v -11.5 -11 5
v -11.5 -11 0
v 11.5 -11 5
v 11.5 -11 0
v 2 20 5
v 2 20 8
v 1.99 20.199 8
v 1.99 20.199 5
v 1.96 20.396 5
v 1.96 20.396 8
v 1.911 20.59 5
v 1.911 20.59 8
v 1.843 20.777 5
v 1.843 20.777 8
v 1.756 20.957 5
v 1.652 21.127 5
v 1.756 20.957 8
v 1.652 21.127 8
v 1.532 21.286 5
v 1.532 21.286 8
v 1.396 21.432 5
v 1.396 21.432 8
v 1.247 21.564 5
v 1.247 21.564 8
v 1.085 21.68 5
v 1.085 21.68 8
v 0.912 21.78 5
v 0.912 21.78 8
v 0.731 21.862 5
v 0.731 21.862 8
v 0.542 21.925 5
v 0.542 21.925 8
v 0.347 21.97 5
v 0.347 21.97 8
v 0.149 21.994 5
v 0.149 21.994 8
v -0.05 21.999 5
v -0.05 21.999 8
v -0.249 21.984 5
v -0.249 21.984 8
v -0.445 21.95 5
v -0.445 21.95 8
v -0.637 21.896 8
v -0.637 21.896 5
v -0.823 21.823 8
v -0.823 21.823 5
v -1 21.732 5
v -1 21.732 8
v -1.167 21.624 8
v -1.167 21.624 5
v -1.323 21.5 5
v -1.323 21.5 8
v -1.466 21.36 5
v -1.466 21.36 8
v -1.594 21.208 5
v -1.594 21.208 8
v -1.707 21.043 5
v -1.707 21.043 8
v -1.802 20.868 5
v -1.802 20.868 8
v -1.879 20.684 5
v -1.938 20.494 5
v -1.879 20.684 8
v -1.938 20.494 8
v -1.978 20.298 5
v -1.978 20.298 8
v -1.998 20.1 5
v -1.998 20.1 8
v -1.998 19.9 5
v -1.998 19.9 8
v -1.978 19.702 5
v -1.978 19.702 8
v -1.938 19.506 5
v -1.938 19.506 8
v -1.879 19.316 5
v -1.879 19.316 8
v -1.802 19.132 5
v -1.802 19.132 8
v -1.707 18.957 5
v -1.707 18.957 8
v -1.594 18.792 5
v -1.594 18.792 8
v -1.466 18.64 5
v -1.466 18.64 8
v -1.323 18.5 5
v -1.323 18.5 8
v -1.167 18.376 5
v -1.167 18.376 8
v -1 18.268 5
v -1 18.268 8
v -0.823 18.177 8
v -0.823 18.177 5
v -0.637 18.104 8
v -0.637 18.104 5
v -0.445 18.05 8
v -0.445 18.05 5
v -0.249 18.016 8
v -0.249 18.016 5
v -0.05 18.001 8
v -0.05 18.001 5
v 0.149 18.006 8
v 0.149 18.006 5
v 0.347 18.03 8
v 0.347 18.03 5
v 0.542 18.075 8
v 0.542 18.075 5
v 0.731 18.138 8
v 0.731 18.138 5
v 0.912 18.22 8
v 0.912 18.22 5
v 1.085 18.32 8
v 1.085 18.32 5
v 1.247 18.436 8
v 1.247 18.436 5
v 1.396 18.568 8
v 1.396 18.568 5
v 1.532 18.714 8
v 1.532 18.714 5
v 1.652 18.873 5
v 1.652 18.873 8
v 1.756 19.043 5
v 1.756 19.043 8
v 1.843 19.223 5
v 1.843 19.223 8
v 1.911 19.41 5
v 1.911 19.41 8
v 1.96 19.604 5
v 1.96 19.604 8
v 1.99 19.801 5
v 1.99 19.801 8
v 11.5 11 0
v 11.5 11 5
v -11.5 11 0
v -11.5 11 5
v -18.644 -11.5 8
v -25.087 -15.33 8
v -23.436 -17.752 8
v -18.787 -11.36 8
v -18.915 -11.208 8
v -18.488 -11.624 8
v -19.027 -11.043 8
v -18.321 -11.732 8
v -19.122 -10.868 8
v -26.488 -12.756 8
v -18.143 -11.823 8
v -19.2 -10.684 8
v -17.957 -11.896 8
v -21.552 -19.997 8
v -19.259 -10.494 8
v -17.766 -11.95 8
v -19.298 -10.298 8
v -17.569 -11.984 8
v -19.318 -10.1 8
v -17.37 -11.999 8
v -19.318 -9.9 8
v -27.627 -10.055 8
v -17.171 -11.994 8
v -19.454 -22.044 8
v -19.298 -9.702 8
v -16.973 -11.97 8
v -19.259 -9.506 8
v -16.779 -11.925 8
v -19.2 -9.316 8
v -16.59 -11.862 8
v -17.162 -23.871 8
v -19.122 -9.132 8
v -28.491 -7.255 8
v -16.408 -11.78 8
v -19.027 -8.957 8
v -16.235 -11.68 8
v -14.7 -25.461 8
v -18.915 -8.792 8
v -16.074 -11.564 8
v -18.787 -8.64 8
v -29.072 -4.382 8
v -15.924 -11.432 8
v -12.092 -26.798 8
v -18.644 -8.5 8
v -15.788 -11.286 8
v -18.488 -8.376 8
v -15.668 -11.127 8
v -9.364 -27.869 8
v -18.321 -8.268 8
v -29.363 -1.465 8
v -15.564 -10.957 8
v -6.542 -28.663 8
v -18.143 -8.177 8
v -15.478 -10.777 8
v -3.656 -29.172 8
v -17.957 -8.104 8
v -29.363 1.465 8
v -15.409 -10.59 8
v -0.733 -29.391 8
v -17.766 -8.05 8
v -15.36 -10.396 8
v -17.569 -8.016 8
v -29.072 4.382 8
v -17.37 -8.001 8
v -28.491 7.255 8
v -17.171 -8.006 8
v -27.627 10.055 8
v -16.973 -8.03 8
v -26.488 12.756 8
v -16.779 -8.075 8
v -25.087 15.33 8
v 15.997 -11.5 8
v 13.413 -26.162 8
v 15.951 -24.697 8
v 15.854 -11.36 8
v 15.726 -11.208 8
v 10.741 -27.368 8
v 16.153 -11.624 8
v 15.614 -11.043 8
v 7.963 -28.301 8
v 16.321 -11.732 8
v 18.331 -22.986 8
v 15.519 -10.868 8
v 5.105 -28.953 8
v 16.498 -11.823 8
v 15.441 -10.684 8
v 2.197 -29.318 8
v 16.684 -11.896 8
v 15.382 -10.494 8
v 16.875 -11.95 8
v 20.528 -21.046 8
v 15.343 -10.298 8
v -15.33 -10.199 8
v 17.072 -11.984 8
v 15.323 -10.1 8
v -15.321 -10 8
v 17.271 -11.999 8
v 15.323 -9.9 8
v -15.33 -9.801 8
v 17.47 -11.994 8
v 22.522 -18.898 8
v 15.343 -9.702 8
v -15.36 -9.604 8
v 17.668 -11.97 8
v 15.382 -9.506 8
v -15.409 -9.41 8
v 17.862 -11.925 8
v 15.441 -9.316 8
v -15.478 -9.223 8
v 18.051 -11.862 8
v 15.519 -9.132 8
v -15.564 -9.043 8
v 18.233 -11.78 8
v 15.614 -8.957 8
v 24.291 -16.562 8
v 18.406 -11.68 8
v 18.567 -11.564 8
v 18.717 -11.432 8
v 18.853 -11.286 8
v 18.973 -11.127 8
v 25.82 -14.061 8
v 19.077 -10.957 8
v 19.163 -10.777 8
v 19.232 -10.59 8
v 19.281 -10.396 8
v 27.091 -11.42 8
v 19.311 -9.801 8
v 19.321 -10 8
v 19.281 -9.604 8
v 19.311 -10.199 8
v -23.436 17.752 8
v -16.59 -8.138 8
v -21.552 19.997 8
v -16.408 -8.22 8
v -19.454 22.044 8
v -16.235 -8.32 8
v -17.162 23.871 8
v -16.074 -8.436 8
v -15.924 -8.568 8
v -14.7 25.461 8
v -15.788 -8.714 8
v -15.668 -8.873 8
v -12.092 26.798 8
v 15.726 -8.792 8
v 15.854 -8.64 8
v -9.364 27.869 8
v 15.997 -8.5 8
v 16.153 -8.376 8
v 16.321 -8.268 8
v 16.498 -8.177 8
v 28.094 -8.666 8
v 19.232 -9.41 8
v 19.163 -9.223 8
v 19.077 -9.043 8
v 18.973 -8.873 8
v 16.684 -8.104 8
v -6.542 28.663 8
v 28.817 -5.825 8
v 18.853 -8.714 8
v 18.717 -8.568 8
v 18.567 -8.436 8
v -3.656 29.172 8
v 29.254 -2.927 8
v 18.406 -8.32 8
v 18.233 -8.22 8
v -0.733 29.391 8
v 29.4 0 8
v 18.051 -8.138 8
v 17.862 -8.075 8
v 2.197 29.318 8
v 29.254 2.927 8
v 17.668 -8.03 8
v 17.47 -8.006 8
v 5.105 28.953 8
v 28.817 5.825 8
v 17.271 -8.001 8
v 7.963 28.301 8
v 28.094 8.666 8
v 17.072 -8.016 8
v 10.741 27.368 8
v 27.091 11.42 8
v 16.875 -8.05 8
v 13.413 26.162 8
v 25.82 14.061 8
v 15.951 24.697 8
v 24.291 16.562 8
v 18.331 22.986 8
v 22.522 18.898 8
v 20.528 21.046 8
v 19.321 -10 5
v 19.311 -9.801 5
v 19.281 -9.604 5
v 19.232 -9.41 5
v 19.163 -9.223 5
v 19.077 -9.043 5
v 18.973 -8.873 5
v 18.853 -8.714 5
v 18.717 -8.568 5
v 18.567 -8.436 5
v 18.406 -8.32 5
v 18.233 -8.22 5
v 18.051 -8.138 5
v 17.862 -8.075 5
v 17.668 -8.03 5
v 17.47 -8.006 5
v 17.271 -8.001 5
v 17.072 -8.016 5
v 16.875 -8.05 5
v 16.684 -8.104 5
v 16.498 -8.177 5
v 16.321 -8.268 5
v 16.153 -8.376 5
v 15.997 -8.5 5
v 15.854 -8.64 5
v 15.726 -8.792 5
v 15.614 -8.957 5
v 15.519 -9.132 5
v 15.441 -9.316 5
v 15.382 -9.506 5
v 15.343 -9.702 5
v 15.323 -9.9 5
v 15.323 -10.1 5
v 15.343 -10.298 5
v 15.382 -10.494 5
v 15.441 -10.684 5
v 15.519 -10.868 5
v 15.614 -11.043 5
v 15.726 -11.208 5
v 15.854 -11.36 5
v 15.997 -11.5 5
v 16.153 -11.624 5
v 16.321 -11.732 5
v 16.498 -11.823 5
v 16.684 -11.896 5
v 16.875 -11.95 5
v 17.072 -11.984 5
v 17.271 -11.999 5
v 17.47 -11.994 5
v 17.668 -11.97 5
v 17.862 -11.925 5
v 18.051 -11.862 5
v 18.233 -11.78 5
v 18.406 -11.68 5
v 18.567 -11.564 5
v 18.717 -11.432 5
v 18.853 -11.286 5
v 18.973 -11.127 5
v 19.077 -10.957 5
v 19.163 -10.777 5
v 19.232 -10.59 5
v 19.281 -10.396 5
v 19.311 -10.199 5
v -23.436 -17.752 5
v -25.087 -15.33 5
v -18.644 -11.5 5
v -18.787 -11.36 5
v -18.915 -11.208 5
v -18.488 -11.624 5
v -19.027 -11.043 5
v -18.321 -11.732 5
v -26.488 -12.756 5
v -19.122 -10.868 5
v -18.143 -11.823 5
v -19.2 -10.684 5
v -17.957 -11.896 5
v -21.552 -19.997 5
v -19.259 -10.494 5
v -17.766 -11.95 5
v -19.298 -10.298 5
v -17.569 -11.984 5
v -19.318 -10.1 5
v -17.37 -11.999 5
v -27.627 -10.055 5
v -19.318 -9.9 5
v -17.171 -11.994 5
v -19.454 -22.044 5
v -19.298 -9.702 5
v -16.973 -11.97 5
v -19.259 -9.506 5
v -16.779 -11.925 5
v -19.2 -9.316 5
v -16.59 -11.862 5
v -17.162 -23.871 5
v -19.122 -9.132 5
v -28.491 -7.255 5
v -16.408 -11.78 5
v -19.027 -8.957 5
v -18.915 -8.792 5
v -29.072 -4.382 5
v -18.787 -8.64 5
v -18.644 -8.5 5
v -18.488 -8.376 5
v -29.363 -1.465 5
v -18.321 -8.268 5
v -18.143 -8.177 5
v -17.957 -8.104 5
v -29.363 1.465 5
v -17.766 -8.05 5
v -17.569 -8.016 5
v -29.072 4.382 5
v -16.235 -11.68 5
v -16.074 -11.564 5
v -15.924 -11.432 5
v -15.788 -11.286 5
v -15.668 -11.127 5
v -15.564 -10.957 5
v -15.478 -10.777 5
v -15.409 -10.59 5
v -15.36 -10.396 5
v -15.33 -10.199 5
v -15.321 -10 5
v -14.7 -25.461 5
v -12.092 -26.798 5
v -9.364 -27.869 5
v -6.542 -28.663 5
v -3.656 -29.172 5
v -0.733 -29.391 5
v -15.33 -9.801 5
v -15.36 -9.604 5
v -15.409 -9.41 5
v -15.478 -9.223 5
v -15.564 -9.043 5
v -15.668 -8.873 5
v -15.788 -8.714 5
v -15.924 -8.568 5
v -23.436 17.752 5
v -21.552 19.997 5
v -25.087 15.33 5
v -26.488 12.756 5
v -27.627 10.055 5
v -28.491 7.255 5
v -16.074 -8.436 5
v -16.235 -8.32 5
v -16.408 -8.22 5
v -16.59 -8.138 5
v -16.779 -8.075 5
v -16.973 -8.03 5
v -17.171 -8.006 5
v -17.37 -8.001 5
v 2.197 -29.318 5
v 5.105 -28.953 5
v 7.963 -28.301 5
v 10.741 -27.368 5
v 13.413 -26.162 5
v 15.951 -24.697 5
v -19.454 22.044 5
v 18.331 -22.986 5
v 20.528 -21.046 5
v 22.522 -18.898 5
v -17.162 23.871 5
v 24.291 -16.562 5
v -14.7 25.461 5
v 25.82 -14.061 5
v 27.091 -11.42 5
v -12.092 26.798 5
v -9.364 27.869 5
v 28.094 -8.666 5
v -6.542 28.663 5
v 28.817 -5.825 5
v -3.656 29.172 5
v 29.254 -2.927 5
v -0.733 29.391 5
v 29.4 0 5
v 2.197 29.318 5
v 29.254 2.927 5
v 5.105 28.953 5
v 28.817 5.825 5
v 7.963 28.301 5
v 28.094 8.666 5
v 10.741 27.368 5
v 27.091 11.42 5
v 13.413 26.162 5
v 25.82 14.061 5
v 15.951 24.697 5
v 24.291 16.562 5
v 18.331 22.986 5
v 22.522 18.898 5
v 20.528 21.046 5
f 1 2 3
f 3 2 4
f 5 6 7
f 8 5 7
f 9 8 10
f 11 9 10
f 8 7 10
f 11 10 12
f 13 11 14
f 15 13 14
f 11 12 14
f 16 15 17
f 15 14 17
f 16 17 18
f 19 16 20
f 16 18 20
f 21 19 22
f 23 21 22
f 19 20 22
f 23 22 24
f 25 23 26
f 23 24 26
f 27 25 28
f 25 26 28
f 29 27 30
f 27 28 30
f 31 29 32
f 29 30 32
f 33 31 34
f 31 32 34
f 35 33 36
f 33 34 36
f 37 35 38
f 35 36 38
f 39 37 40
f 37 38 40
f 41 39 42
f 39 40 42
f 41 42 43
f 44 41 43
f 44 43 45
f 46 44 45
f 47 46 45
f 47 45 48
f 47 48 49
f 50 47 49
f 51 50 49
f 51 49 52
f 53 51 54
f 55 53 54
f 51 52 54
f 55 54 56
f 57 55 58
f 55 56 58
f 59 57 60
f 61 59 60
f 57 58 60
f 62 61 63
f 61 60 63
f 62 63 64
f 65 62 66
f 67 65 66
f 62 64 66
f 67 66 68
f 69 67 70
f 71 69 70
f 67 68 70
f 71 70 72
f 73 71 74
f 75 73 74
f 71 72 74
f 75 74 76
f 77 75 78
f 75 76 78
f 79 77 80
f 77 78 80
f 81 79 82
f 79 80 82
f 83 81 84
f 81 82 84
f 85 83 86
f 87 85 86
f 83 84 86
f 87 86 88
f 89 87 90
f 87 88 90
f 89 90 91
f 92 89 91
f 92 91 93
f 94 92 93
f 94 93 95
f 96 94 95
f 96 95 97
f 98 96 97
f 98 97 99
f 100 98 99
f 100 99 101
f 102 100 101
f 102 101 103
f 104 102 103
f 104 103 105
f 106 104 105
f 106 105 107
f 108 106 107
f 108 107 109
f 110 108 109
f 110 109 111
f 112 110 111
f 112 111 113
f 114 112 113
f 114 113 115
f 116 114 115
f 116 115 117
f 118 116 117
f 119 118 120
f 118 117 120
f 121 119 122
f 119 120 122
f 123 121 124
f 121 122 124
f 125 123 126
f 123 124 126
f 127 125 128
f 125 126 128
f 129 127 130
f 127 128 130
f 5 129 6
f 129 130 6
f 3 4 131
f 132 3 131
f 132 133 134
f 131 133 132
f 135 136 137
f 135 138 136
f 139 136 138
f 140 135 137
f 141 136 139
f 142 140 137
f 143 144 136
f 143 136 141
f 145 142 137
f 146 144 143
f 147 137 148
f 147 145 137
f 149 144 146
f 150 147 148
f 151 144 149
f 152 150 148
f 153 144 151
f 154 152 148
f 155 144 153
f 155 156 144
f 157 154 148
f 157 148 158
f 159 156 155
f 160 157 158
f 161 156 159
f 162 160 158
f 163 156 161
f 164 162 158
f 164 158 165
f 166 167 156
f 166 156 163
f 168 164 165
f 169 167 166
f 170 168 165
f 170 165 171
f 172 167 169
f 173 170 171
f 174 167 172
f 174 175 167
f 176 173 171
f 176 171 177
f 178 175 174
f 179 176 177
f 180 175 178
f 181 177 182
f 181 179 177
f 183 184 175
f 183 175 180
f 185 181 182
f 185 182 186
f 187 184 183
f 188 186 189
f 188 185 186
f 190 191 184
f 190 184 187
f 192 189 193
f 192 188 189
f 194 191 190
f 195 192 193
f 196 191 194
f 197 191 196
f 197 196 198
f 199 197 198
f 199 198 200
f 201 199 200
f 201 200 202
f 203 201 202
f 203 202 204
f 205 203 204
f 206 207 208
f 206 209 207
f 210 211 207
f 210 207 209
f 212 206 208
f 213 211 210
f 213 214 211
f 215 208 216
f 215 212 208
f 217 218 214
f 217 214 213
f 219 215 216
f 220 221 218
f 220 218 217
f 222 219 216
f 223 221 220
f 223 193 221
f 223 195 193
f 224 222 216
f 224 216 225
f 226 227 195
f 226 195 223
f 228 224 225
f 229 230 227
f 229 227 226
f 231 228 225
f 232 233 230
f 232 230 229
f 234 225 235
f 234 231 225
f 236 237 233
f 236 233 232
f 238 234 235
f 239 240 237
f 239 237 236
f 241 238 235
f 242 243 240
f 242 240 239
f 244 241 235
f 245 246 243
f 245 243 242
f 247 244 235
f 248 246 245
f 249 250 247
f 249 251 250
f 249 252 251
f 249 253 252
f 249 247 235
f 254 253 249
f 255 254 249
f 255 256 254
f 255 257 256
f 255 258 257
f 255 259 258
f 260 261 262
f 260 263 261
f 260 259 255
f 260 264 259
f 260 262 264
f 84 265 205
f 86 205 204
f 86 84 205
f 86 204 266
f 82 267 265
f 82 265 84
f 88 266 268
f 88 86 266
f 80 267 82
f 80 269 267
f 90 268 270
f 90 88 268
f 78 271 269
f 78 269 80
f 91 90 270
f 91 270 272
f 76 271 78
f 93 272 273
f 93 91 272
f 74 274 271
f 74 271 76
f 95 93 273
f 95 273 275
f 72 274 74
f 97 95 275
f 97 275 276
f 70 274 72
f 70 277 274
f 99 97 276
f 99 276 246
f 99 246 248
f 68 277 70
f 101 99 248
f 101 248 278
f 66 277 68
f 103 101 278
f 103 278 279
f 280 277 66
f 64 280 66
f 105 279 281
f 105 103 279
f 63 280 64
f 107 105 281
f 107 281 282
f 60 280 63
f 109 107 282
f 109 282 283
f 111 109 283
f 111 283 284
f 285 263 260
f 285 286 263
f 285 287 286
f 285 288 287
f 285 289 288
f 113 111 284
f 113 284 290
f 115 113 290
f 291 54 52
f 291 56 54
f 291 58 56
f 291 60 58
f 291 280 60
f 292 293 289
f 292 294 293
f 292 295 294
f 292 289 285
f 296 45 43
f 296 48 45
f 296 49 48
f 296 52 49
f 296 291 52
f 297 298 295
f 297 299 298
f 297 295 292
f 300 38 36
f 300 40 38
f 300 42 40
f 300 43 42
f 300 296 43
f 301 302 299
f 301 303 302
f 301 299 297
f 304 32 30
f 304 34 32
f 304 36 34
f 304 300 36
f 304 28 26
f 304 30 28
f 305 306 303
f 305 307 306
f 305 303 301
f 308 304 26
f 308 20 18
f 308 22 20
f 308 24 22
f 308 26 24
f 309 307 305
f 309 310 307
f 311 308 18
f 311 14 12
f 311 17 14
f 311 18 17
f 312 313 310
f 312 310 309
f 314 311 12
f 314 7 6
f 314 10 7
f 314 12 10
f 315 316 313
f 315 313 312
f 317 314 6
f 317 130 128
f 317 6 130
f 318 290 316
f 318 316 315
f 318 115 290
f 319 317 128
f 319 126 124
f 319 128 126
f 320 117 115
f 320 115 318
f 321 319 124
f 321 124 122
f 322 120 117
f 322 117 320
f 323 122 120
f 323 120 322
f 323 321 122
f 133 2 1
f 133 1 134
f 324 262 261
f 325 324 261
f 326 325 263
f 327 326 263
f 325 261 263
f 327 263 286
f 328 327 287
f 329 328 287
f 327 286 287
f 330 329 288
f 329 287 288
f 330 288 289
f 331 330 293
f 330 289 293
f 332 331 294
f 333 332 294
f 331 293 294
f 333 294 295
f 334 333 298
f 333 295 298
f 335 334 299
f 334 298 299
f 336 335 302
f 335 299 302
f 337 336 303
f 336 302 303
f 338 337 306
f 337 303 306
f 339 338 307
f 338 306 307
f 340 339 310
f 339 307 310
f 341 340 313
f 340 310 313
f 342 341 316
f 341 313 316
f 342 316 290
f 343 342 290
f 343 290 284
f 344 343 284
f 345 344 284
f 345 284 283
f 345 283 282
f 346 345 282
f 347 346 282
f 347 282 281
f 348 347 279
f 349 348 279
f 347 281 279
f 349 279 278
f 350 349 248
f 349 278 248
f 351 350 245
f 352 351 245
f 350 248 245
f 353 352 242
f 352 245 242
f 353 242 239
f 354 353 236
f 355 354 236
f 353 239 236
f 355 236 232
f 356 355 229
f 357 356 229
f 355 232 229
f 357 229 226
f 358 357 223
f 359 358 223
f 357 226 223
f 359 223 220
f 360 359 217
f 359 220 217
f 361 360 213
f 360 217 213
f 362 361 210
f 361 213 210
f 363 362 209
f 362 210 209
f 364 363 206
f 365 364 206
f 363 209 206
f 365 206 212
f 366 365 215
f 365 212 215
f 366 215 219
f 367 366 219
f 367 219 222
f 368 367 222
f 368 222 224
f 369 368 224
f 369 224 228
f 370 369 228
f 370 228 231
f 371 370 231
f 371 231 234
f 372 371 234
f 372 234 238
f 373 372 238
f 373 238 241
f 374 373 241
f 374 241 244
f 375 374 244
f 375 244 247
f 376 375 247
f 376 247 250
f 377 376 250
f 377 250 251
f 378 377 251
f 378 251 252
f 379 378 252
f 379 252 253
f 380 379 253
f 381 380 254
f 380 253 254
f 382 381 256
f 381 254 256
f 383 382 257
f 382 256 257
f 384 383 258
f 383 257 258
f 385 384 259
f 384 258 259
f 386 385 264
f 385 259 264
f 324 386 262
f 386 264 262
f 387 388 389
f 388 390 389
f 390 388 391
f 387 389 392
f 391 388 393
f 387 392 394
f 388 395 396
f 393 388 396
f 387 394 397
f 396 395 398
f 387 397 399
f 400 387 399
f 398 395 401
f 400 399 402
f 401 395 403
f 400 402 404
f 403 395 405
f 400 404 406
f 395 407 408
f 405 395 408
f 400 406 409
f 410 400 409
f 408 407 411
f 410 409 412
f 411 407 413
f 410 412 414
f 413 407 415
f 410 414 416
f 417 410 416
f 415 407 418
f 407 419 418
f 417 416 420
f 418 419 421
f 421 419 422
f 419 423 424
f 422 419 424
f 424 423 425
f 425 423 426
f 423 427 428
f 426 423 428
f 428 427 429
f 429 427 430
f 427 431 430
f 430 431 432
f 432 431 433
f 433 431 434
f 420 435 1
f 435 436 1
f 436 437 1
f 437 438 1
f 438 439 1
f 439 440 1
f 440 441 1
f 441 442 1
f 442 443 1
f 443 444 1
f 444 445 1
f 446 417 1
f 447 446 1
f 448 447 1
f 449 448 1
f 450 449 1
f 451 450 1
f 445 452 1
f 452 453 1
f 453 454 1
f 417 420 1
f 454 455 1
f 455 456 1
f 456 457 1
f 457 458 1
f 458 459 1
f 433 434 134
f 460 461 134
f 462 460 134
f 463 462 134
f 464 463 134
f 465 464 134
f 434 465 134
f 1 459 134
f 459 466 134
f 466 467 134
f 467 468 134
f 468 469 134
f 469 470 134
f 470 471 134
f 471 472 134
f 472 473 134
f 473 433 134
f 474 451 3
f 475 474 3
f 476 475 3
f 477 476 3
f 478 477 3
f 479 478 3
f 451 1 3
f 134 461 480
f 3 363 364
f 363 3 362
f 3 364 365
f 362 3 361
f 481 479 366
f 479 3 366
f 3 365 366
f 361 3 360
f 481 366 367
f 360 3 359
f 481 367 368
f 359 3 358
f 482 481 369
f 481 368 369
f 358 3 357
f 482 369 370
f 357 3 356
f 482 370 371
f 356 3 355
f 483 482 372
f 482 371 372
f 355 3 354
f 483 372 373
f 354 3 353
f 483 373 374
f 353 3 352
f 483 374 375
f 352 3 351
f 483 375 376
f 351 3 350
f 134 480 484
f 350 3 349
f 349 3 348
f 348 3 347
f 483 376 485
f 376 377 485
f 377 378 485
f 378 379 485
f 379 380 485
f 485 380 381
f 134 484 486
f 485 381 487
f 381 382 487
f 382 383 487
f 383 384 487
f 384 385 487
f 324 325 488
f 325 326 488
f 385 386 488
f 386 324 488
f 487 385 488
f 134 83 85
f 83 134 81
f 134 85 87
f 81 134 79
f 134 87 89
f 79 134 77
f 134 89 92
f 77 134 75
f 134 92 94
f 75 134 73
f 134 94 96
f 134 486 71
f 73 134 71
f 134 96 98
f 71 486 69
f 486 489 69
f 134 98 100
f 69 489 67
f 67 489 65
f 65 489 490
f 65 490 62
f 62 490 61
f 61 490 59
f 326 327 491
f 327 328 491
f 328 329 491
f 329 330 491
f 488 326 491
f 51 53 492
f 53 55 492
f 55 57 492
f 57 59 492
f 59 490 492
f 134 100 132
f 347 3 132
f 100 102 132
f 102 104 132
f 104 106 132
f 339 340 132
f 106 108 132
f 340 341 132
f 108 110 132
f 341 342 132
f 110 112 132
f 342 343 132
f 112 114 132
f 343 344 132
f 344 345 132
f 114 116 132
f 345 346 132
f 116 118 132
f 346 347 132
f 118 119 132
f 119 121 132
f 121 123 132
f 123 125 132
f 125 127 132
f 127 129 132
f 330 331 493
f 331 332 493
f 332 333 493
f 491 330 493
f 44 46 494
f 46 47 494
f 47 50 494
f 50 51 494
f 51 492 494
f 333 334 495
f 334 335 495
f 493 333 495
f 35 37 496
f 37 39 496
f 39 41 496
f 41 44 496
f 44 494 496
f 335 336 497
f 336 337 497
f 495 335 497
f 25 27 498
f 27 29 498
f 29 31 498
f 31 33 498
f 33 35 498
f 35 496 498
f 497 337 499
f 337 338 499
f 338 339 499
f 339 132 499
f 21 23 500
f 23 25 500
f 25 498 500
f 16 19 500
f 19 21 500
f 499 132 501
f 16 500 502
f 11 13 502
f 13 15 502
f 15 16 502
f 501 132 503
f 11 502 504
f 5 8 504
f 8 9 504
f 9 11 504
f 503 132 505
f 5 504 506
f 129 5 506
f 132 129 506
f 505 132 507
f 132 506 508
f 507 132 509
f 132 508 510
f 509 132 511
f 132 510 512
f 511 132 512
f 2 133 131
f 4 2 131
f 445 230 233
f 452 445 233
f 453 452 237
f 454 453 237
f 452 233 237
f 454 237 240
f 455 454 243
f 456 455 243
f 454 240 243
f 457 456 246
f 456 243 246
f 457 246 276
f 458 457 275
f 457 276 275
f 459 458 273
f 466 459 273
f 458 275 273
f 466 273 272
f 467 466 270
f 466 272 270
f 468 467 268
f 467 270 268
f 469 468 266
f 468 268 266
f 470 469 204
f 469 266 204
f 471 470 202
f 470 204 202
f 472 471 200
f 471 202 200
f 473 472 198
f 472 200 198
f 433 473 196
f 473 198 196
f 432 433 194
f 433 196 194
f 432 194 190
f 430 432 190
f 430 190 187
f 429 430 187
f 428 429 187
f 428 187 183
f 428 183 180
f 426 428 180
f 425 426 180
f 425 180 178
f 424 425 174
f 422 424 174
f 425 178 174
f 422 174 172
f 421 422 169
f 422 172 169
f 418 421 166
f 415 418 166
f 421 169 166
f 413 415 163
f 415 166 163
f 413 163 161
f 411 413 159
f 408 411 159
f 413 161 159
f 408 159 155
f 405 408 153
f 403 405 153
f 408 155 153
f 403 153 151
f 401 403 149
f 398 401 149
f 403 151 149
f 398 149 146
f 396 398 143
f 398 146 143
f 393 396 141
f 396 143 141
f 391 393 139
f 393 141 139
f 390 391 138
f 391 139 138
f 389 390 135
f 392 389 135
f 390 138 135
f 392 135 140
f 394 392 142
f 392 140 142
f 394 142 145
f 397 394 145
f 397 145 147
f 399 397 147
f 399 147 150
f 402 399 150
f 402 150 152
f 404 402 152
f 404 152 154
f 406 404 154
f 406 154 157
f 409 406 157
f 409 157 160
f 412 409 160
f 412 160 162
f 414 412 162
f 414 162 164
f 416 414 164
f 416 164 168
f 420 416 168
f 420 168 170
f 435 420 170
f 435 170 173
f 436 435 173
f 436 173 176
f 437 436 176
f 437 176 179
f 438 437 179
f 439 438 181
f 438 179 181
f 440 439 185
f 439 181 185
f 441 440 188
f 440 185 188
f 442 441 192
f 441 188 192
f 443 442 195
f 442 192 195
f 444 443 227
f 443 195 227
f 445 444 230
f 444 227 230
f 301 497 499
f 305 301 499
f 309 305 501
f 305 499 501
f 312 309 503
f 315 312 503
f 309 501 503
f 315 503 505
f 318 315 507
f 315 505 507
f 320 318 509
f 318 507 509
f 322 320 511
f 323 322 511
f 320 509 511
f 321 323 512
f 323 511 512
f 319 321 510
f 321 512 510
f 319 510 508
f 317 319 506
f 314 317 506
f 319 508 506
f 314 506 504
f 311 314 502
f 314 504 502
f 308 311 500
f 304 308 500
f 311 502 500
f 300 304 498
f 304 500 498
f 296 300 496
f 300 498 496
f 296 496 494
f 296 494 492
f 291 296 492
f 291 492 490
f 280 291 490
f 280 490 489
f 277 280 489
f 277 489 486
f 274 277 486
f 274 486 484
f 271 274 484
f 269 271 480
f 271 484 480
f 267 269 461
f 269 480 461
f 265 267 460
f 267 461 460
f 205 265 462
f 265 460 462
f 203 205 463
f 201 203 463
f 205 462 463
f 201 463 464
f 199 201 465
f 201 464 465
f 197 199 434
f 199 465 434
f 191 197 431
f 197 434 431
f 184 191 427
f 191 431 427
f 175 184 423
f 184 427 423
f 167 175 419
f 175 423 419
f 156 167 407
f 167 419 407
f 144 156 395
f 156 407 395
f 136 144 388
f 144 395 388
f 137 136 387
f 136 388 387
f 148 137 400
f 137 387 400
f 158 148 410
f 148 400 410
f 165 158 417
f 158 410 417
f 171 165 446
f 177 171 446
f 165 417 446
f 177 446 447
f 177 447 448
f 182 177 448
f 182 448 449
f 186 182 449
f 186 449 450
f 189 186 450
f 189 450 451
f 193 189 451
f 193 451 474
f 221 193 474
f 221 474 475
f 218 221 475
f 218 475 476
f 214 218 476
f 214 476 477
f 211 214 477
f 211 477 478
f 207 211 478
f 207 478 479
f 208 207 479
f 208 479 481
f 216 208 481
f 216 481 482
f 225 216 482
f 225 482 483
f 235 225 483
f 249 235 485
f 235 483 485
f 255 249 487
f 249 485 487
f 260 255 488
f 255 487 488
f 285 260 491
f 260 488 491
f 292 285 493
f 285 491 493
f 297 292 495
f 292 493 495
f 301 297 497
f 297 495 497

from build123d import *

# Parameters (mm, degrees)
SKETCH1_W           = 23
SKETCH1_H           = 22
BOSS_EXTRUDE1_DEPTH = 5
SKETCH3_R           = 29.4
BOSS_EXTRUDE2_DEPTH = 3
SKETCH4_R           = 2
CUT_EXTRUDE1_DEPTH  = 3


with BuildPart() as part:
    # Sketch1 → Boss-Extrude1 (new body)
    with BuildSketch(Plane.XY):
        Rectangle(SKETCH1_W, SKETCH1_H)
    extrude(amount=BOSS_EXTRUDE1_DEPTH)

    # Sketch3 → Boss-Extrude2 (add)
    with BuildSketch(Plane.XY.offset(5)):
        Circle(SKETCH3_R)
    extrude(amount=BOSS_EXTRUDE2_DEPTH)

    # Sketch4 → Cut-Extrude1 (cut)
    with BuildSketch(Plane.XY.offset(8)):
        with Locations((0, 20)):
            Circle(SKETCH4_R)
        with Locations((17.320508076, -10)):
            Circle(SKETCH4_R)
        with Locations((-17.320508076, -10)):
            Circle(SKETCH4_R)
    extrude(amount=-CUT_EXTRUDE1_DEPTH, mode=Mode.SUBTRACT)


solid = part.part
